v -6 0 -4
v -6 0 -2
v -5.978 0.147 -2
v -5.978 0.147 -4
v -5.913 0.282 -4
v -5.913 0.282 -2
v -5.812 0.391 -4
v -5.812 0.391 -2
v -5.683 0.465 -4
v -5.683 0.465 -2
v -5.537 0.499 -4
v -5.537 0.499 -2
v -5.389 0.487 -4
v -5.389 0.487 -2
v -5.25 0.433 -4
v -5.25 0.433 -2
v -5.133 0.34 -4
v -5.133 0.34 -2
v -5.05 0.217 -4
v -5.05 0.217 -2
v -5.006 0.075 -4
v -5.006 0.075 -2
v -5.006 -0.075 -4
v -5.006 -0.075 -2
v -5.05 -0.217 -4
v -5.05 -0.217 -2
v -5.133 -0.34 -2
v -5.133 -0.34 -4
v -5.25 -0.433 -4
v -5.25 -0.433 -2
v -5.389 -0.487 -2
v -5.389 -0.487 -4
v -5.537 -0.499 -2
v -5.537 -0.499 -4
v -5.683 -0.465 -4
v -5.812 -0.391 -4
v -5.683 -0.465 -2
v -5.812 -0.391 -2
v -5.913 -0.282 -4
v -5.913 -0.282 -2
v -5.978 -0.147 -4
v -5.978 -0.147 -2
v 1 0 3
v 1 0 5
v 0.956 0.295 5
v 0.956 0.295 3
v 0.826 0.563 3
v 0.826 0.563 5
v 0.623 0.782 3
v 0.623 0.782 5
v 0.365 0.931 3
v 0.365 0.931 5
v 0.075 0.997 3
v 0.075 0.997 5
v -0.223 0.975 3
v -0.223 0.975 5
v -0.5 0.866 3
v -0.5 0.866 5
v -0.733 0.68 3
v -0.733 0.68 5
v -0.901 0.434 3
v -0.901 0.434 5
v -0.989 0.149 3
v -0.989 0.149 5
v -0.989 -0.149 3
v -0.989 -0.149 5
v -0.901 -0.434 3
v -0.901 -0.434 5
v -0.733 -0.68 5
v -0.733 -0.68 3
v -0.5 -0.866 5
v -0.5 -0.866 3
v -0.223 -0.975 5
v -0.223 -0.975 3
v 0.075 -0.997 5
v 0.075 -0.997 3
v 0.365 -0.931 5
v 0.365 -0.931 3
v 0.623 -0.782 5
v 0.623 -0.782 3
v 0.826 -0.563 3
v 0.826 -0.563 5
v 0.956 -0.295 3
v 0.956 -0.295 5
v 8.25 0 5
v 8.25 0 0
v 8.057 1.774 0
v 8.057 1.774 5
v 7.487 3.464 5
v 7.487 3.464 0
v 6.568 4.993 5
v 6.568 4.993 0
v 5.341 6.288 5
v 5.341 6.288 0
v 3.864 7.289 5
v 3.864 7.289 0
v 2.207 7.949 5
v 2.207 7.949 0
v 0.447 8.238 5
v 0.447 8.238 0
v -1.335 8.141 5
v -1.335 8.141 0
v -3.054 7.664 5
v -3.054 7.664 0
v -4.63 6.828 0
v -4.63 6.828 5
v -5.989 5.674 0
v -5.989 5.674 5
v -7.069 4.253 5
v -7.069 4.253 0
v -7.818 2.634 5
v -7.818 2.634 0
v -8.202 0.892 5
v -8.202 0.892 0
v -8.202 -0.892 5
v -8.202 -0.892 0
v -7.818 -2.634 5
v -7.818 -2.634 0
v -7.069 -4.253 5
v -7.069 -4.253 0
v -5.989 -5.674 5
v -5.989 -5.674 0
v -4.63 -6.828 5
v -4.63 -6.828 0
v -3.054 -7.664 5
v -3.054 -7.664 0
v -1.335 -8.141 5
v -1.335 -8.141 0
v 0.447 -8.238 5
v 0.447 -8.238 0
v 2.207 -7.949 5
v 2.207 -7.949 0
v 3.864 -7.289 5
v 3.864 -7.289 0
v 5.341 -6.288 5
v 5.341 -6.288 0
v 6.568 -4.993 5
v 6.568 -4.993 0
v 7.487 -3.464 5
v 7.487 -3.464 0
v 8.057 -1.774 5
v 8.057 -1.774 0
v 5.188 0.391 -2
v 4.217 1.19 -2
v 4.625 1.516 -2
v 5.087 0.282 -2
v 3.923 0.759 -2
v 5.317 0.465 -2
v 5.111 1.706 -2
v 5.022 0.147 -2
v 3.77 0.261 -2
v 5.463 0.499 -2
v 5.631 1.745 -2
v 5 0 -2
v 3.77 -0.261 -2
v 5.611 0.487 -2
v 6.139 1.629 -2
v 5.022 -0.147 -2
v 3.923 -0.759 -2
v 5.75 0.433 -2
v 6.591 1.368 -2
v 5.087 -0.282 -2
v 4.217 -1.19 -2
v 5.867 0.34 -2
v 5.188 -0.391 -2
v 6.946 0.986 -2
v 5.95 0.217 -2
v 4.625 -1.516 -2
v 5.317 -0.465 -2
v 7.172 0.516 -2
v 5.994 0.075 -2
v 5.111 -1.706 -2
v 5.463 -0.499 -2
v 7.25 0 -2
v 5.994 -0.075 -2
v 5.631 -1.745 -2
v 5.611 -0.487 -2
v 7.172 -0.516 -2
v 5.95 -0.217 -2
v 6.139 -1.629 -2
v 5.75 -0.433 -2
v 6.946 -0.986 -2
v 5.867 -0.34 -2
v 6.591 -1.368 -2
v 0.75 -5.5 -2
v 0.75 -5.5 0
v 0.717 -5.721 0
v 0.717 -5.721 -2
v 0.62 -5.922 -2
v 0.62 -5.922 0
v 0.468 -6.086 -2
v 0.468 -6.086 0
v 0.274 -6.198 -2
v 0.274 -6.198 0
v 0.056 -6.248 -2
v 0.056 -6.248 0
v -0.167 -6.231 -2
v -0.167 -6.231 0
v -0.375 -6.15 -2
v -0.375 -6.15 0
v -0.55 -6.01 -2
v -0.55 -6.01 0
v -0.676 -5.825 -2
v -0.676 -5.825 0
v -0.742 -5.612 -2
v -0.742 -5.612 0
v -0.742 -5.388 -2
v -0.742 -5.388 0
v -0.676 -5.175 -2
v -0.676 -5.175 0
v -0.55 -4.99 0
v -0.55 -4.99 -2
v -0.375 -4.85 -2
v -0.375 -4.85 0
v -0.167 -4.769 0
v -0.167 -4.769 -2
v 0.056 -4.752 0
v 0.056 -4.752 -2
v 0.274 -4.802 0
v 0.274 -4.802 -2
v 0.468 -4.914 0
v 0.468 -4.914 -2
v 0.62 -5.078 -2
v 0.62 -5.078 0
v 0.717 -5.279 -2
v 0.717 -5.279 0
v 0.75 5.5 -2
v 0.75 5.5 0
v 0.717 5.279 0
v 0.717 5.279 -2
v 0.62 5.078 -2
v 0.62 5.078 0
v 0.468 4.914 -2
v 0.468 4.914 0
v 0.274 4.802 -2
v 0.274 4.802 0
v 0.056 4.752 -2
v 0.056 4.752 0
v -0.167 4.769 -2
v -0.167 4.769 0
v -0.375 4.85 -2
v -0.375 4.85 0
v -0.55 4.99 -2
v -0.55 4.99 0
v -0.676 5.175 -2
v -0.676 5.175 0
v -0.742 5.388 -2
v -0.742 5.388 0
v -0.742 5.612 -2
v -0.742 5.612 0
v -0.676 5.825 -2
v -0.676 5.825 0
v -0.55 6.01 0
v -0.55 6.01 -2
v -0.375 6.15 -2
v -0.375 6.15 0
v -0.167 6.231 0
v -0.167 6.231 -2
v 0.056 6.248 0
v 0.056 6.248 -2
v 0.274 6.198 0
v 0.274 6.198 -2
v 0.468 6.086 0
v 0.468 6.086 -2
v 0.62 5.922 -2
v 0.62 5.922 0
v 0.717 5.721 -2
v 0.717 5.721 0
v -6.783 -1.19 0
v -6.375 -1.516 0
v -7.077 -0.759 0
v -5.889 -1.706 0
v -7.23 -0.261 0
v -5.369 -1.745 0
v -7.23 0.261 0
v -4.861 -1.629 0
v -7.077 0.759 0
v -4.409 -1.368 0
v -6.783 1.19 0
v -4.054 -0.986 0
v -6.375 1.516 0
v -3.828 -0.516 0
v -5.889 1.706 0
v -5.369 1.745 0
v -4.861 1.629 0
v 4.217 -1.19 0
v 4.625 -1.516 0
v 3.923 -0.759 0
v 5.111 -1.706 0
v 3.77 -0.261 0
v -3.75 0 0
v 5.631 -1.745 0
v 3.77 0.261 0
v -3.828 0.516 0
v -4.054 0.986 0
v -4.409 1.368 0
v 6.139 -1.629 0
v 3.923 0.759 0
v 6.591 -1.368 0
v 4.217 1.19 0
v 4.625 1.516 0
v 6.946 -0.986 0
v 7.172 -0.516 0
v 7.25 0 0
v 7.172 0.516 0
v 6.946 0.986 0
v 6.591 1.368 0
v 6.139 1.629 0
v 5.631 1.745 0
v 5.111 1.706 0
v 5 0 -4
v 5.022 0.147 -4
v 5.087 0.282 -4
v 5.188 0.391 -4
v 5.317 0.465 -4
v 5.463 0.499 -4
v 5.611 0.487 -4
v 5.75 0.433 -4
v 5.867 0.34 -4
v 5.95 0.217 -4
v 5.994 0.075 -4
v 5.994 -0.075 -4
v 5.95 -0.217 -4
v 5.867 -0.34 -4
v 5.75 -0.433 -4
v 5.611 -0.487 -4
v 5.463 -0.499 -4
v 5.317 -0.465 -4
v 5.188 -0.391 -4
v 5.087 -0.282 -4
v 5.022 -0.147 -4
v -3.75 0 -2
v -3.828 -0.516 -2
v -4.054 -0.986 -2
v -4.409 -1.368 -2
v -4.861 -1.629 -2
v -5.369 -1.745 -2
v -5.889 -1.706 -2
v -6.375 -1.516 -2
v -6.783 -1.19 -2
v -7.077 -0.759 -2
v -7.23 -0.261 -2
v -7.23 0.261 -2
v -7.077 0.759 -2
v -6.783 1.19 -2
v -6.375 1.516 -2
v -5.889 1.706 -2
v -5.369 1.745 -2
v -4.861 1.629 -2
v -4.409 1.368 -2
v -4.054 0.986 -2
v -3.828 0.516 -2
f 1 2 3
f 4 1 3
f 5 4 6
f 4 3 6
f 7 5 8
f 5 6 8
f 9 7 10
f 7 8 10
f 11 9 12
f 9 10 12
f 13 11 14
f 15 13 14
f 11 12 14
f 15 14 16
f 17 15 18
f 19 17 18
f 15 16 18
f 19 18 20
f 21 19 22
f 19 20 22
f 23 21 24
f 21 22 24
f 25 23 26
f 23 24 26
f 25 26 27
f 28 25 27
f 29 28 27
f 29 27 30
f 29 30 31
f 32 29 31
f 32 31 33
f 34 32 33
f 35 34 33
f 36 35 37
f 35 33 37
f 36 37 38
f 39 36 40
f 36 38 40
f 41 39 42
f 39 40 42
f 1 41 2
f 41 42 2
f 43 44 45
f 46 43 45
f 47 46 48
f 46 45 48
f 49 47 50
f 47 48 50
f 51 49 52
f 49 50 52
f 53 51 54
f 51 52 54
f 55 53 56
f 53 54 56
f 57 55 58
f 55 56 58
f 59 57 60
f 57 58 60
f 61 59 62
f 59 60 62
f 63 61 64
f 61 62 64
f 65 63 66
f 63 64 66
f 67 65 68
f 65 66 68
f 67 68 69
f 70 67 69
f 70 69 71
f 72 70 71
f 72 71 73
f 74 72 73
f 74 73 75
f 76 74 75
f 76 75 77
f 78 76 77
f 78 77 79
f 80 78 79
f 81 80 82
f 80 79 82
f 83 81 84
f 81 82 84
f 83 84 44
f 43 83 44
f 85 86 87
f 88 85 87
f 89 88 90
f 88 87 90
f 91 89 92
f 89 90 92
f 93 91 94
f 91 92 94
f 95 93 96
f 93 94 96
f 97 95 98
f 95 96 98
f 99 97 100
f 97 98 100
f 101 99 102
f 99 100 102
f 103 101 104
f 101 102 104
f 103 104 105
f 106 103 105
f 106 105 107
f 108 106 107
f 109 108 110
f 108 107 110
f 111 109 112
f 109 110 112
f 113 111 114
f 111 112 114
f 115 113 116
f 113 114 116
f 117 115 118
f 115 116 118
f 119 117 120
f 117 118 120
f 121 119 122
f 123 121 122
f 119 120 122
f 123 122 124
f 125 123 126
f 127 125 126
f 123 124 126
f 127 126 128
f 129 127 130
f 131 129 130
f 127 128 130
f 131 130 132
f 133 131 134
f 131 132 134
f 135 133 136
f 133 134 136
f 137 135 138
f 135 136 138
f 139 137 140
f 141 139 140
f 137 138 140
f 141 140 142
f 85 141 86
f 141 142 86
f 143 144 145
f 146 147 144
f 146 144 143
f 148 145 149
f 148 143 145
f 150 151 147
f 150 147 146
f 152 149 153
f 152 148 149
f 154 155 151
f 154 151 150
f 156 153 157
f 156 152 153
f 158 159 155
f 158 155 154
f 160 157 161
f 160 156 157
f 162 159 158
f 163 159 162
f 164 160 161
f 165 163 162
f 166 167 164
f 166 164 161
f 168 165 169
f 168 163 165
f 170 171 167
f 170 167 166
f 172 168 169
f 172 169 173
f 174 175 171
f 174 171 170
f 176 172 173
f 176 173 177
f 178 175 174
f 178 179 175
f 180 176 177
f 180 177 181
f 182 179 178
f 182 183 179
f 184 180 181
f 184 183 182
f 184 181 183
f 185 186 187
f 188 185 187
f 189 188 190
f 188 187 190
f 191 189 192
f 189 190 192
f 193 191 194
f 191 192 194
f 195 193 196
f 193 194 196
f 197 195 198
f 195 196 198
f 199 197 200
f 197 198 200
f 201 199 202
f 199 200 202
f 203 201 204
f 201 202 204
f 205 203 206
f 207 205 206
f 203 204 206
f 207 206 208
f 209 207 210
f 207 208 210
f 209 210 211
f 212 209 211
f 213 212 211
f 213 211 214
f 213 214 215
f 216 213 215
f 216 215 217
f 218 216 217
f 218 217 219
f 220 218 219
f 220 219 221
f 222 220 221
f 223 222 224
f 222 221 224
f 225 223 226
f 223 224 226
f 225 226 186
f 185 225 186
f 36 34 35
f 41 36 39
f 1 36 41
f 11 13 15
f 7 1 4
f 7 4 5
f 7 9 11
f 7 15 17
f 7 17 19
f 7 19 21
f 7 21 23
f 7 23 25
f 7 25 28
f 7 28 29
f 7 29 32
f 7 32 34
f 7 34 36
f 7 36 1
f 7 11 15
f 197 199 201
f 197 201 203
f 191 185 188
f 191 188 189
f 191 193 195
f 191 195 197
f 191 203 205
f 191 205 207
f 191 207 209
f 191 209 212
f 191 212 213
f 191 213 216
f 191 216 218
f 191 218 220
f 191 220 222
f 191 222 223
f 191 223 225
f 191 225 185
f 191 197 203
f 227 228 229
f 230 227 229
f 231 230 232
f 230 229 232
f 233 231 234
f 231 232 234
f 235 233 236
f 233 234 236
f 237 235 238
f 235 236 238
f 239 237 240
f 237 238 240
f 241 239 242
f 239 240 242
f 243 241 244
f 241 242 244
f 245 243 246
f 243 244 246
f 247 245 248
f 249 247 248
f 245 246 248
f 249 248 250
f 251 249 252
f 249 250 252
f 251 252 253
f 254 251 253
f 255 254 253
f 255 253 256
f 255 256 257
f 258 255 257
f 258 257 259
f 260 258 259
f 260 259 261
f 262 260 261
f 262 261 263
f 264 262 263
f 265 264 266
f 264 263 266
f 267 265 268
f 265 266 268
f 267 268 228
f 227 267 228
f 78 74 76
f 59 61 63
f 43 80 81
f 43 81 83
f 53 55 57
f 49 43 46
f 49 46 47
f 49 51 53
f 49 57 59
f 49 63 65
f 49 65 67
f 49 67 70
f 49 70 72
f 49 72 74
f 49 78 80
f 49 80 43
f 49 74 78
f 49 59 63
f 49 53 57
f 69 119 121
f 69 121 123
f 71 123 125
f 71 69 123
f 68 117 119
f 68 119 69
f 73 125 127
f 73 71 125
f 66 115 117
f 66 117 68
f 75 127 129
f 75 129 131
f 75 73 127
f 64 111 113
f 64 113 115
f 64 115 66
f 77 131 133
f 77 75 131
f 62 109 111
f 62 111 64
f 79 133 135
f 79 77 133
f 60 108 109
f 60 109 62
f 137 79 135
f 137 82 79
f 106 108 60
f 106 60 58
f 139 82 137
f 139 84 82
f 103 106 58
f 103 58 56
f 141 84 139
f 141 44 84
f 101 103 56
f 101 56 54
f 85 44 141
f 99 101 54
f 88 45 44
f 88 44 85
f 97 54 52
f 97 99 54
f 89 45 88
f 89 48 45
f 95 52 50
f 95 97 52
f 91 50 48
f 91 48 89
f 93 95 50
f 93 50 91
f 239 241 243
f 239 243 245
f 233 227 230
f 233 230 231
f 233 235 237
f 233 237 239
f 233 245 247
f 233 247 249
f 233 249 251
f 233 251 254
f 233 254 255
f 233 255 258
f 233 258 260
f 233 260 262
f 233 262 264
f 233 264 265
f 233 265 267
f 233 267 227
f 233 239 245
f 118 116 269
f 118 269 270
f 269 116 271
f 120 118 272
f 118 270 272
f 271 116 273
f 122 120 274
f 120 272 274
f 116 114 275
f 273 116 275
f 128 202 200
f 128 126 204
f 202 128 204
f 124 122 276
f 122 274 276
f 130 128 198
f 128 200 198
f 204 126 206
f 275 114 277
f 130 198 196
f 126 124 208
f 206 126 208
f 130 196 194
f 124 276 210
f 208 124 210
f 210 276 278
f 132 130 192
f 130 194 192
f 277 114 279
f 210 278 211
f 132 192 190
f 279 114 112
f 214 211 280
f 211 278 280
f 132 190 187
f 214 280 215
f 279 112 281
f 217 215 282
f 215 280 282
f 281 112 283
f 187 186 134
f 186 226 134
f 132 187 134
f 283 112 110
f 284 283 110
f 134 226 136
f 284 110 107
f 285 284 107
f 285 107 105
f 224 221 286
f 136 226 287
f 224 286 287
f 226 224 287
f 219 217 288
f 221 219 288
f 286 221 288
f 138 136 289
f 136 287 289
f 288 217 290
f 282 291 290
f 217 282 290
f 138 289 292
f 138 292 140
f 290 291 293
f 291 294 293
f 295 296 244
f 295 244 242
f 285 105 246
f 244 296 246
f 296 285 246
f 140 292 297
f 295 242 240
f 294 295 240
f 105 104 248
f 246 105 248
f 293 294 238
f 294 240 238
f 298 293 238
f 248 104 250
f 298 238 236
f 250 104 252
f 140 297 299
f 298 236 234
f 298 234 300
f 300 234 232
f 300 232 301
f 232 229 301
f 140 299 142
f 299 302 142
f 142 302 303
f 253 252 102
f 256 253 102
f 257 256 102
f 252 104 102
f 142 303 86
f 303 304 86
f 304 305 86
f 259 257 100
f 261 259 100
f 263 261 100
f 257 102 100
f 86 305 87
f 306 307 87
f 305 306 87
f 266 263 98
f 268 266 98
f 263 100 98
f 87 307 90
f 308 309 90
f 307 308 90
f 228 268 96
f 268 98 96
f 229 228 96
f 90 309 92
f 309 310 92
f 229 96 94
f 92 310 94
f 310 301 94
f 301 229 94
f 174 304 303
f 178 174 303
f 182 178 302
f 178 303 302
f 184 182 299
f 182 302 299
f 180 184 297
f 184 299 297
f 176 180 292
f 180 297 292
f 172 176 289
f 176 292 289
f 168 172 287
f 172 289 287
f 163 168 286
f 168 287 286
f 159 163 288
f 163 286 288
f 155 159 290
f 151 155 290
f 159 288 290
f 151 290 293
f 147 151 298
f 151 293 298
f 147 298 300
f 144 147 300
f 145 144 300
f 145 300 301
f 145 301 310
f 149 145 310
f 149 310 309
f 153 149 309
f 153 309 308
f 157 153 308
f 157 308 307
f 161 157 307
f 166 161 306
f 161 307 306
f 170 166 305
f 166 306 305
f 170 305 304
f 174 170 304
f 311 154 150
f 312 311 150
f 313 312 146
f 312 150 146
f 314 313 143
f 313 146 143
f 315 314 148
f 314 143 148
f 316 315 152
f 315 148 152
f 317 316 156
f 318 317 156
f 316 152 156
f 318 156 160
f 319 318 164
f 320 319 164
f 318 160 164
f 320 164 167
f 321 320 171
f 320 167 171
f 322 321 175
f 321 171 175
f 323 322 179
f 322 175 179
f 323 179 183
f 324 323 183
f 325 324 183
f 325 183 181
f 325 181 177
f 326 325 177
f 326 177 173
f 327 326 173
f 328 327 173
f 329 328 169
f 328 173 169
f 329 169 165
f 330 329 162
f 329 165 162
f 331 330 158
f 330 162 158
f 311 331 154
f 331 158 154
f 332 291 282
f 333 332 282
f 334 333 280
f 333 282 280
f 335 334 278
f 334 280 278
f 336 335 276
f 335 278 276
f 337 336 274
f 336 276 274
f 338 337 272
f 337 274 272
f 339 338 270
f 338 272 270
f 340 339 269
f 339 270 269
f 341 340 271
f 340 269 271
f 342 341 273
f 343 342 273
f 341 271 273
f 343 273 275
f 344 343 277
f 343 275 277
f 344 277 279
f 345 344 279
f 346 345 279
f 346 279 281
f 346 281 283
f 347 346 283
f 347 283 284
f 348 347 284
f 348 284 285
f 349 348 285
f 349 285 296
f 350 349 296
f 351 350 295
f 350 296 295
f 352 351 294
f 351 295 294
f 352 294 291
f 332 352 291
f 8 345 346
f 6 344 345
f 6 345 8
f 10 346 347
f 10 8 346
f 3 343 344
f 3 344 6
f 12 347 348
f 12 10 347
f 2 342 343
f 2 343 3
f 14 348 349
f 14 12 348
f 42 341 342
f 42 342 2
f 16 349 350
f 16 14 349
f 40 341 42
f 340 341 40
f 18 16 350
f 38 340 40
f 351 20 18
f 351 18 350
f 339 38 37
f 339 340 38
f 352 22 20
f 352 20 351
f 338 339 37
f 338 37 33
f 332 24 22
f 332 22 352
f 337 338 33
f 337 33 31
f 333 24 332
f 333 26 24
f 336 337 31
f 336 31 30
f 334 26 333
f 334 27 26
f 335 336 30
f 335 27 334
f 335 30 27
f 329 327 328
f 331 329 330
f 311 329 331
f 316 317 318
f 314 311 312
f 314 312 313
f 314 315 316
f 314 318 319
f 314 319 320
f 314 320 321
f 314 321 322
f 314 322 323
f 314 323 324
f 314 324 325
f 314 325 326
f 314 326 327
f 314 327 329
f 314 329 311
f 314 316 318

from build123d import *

# Parameters (mm, degrees)
SKETCH1_R           = 8.25
BOSS_EXTRUDE1_DEPTH = 5
SKETCH2_R           = 1
CUT_EXTRUDE1_DEPTH  = 2
SKETCH3_R           = 1.75
SKETCH3_R_2         = 0.75
BOSS_EXTRUDE2_DEPTH = 2
SKETCH4_R           = 0.5
BOSS_EXTRUDE3_DEPTH = 2


with BuildPart() as part:
    # Sketch1 → Boss-Extrude1 (new body)
    with BuildSketch(Plane.XY):
        Circle(SKETCH1_R)
    extrude(amount=BOSS_EXTRUDE1_DEPTH)

    # Sketch2 → Cut-Extrude1 (cut)
    with BuildSketch(Plane.XY.offset(5)):
        Circle(SKETCH2_R)
    extrude(amount=-CUT_EXTRUDE1_DEPTH, mode=Mode.SUBTRACT)

    # Sketch3 → Boss-Extrude2 (add)
    with BuildSketch(Plane(origin=(0, 0, 0), x_dir=(-1, 0, 0), z_dir=(0, 0, -1))):
        with Locations(Location((-5.5, 0, 0), (0, 0, 180))):
            Circle(SKETCH3_R)
        with Locations(Location((5.5, 0, 0), (0, 0, 180))):
            Circle(SKETCH3_R)
        with Locations(Location((0, 5.5, 0), (0, 0, 180))):
            Circle(SKETCH3_R_2)
        with Locations(Location((0, -5.5, 0), (0, 0, 180))):
            Circle(SKETCH3_R_2)
    extrude(amount=BOSS_EXTRUDE2_DEPTH)

    # Sketch4 → Boss-Extrude3 (add)
    with BuildSketch(Plane(origin=(0, 0, -2), x_dir=(-1, 0, 0), z_dir=(0, 0, -1))):
        with Locations((-5.5, 0)):
            Circle(SKETCH4_R)
        with Locations((5.5, 0)):
            Circle(SKETCH4_R)
    extrude(amount=BOSS_EXTRUDE3_DEPTH)


solid = part.part
